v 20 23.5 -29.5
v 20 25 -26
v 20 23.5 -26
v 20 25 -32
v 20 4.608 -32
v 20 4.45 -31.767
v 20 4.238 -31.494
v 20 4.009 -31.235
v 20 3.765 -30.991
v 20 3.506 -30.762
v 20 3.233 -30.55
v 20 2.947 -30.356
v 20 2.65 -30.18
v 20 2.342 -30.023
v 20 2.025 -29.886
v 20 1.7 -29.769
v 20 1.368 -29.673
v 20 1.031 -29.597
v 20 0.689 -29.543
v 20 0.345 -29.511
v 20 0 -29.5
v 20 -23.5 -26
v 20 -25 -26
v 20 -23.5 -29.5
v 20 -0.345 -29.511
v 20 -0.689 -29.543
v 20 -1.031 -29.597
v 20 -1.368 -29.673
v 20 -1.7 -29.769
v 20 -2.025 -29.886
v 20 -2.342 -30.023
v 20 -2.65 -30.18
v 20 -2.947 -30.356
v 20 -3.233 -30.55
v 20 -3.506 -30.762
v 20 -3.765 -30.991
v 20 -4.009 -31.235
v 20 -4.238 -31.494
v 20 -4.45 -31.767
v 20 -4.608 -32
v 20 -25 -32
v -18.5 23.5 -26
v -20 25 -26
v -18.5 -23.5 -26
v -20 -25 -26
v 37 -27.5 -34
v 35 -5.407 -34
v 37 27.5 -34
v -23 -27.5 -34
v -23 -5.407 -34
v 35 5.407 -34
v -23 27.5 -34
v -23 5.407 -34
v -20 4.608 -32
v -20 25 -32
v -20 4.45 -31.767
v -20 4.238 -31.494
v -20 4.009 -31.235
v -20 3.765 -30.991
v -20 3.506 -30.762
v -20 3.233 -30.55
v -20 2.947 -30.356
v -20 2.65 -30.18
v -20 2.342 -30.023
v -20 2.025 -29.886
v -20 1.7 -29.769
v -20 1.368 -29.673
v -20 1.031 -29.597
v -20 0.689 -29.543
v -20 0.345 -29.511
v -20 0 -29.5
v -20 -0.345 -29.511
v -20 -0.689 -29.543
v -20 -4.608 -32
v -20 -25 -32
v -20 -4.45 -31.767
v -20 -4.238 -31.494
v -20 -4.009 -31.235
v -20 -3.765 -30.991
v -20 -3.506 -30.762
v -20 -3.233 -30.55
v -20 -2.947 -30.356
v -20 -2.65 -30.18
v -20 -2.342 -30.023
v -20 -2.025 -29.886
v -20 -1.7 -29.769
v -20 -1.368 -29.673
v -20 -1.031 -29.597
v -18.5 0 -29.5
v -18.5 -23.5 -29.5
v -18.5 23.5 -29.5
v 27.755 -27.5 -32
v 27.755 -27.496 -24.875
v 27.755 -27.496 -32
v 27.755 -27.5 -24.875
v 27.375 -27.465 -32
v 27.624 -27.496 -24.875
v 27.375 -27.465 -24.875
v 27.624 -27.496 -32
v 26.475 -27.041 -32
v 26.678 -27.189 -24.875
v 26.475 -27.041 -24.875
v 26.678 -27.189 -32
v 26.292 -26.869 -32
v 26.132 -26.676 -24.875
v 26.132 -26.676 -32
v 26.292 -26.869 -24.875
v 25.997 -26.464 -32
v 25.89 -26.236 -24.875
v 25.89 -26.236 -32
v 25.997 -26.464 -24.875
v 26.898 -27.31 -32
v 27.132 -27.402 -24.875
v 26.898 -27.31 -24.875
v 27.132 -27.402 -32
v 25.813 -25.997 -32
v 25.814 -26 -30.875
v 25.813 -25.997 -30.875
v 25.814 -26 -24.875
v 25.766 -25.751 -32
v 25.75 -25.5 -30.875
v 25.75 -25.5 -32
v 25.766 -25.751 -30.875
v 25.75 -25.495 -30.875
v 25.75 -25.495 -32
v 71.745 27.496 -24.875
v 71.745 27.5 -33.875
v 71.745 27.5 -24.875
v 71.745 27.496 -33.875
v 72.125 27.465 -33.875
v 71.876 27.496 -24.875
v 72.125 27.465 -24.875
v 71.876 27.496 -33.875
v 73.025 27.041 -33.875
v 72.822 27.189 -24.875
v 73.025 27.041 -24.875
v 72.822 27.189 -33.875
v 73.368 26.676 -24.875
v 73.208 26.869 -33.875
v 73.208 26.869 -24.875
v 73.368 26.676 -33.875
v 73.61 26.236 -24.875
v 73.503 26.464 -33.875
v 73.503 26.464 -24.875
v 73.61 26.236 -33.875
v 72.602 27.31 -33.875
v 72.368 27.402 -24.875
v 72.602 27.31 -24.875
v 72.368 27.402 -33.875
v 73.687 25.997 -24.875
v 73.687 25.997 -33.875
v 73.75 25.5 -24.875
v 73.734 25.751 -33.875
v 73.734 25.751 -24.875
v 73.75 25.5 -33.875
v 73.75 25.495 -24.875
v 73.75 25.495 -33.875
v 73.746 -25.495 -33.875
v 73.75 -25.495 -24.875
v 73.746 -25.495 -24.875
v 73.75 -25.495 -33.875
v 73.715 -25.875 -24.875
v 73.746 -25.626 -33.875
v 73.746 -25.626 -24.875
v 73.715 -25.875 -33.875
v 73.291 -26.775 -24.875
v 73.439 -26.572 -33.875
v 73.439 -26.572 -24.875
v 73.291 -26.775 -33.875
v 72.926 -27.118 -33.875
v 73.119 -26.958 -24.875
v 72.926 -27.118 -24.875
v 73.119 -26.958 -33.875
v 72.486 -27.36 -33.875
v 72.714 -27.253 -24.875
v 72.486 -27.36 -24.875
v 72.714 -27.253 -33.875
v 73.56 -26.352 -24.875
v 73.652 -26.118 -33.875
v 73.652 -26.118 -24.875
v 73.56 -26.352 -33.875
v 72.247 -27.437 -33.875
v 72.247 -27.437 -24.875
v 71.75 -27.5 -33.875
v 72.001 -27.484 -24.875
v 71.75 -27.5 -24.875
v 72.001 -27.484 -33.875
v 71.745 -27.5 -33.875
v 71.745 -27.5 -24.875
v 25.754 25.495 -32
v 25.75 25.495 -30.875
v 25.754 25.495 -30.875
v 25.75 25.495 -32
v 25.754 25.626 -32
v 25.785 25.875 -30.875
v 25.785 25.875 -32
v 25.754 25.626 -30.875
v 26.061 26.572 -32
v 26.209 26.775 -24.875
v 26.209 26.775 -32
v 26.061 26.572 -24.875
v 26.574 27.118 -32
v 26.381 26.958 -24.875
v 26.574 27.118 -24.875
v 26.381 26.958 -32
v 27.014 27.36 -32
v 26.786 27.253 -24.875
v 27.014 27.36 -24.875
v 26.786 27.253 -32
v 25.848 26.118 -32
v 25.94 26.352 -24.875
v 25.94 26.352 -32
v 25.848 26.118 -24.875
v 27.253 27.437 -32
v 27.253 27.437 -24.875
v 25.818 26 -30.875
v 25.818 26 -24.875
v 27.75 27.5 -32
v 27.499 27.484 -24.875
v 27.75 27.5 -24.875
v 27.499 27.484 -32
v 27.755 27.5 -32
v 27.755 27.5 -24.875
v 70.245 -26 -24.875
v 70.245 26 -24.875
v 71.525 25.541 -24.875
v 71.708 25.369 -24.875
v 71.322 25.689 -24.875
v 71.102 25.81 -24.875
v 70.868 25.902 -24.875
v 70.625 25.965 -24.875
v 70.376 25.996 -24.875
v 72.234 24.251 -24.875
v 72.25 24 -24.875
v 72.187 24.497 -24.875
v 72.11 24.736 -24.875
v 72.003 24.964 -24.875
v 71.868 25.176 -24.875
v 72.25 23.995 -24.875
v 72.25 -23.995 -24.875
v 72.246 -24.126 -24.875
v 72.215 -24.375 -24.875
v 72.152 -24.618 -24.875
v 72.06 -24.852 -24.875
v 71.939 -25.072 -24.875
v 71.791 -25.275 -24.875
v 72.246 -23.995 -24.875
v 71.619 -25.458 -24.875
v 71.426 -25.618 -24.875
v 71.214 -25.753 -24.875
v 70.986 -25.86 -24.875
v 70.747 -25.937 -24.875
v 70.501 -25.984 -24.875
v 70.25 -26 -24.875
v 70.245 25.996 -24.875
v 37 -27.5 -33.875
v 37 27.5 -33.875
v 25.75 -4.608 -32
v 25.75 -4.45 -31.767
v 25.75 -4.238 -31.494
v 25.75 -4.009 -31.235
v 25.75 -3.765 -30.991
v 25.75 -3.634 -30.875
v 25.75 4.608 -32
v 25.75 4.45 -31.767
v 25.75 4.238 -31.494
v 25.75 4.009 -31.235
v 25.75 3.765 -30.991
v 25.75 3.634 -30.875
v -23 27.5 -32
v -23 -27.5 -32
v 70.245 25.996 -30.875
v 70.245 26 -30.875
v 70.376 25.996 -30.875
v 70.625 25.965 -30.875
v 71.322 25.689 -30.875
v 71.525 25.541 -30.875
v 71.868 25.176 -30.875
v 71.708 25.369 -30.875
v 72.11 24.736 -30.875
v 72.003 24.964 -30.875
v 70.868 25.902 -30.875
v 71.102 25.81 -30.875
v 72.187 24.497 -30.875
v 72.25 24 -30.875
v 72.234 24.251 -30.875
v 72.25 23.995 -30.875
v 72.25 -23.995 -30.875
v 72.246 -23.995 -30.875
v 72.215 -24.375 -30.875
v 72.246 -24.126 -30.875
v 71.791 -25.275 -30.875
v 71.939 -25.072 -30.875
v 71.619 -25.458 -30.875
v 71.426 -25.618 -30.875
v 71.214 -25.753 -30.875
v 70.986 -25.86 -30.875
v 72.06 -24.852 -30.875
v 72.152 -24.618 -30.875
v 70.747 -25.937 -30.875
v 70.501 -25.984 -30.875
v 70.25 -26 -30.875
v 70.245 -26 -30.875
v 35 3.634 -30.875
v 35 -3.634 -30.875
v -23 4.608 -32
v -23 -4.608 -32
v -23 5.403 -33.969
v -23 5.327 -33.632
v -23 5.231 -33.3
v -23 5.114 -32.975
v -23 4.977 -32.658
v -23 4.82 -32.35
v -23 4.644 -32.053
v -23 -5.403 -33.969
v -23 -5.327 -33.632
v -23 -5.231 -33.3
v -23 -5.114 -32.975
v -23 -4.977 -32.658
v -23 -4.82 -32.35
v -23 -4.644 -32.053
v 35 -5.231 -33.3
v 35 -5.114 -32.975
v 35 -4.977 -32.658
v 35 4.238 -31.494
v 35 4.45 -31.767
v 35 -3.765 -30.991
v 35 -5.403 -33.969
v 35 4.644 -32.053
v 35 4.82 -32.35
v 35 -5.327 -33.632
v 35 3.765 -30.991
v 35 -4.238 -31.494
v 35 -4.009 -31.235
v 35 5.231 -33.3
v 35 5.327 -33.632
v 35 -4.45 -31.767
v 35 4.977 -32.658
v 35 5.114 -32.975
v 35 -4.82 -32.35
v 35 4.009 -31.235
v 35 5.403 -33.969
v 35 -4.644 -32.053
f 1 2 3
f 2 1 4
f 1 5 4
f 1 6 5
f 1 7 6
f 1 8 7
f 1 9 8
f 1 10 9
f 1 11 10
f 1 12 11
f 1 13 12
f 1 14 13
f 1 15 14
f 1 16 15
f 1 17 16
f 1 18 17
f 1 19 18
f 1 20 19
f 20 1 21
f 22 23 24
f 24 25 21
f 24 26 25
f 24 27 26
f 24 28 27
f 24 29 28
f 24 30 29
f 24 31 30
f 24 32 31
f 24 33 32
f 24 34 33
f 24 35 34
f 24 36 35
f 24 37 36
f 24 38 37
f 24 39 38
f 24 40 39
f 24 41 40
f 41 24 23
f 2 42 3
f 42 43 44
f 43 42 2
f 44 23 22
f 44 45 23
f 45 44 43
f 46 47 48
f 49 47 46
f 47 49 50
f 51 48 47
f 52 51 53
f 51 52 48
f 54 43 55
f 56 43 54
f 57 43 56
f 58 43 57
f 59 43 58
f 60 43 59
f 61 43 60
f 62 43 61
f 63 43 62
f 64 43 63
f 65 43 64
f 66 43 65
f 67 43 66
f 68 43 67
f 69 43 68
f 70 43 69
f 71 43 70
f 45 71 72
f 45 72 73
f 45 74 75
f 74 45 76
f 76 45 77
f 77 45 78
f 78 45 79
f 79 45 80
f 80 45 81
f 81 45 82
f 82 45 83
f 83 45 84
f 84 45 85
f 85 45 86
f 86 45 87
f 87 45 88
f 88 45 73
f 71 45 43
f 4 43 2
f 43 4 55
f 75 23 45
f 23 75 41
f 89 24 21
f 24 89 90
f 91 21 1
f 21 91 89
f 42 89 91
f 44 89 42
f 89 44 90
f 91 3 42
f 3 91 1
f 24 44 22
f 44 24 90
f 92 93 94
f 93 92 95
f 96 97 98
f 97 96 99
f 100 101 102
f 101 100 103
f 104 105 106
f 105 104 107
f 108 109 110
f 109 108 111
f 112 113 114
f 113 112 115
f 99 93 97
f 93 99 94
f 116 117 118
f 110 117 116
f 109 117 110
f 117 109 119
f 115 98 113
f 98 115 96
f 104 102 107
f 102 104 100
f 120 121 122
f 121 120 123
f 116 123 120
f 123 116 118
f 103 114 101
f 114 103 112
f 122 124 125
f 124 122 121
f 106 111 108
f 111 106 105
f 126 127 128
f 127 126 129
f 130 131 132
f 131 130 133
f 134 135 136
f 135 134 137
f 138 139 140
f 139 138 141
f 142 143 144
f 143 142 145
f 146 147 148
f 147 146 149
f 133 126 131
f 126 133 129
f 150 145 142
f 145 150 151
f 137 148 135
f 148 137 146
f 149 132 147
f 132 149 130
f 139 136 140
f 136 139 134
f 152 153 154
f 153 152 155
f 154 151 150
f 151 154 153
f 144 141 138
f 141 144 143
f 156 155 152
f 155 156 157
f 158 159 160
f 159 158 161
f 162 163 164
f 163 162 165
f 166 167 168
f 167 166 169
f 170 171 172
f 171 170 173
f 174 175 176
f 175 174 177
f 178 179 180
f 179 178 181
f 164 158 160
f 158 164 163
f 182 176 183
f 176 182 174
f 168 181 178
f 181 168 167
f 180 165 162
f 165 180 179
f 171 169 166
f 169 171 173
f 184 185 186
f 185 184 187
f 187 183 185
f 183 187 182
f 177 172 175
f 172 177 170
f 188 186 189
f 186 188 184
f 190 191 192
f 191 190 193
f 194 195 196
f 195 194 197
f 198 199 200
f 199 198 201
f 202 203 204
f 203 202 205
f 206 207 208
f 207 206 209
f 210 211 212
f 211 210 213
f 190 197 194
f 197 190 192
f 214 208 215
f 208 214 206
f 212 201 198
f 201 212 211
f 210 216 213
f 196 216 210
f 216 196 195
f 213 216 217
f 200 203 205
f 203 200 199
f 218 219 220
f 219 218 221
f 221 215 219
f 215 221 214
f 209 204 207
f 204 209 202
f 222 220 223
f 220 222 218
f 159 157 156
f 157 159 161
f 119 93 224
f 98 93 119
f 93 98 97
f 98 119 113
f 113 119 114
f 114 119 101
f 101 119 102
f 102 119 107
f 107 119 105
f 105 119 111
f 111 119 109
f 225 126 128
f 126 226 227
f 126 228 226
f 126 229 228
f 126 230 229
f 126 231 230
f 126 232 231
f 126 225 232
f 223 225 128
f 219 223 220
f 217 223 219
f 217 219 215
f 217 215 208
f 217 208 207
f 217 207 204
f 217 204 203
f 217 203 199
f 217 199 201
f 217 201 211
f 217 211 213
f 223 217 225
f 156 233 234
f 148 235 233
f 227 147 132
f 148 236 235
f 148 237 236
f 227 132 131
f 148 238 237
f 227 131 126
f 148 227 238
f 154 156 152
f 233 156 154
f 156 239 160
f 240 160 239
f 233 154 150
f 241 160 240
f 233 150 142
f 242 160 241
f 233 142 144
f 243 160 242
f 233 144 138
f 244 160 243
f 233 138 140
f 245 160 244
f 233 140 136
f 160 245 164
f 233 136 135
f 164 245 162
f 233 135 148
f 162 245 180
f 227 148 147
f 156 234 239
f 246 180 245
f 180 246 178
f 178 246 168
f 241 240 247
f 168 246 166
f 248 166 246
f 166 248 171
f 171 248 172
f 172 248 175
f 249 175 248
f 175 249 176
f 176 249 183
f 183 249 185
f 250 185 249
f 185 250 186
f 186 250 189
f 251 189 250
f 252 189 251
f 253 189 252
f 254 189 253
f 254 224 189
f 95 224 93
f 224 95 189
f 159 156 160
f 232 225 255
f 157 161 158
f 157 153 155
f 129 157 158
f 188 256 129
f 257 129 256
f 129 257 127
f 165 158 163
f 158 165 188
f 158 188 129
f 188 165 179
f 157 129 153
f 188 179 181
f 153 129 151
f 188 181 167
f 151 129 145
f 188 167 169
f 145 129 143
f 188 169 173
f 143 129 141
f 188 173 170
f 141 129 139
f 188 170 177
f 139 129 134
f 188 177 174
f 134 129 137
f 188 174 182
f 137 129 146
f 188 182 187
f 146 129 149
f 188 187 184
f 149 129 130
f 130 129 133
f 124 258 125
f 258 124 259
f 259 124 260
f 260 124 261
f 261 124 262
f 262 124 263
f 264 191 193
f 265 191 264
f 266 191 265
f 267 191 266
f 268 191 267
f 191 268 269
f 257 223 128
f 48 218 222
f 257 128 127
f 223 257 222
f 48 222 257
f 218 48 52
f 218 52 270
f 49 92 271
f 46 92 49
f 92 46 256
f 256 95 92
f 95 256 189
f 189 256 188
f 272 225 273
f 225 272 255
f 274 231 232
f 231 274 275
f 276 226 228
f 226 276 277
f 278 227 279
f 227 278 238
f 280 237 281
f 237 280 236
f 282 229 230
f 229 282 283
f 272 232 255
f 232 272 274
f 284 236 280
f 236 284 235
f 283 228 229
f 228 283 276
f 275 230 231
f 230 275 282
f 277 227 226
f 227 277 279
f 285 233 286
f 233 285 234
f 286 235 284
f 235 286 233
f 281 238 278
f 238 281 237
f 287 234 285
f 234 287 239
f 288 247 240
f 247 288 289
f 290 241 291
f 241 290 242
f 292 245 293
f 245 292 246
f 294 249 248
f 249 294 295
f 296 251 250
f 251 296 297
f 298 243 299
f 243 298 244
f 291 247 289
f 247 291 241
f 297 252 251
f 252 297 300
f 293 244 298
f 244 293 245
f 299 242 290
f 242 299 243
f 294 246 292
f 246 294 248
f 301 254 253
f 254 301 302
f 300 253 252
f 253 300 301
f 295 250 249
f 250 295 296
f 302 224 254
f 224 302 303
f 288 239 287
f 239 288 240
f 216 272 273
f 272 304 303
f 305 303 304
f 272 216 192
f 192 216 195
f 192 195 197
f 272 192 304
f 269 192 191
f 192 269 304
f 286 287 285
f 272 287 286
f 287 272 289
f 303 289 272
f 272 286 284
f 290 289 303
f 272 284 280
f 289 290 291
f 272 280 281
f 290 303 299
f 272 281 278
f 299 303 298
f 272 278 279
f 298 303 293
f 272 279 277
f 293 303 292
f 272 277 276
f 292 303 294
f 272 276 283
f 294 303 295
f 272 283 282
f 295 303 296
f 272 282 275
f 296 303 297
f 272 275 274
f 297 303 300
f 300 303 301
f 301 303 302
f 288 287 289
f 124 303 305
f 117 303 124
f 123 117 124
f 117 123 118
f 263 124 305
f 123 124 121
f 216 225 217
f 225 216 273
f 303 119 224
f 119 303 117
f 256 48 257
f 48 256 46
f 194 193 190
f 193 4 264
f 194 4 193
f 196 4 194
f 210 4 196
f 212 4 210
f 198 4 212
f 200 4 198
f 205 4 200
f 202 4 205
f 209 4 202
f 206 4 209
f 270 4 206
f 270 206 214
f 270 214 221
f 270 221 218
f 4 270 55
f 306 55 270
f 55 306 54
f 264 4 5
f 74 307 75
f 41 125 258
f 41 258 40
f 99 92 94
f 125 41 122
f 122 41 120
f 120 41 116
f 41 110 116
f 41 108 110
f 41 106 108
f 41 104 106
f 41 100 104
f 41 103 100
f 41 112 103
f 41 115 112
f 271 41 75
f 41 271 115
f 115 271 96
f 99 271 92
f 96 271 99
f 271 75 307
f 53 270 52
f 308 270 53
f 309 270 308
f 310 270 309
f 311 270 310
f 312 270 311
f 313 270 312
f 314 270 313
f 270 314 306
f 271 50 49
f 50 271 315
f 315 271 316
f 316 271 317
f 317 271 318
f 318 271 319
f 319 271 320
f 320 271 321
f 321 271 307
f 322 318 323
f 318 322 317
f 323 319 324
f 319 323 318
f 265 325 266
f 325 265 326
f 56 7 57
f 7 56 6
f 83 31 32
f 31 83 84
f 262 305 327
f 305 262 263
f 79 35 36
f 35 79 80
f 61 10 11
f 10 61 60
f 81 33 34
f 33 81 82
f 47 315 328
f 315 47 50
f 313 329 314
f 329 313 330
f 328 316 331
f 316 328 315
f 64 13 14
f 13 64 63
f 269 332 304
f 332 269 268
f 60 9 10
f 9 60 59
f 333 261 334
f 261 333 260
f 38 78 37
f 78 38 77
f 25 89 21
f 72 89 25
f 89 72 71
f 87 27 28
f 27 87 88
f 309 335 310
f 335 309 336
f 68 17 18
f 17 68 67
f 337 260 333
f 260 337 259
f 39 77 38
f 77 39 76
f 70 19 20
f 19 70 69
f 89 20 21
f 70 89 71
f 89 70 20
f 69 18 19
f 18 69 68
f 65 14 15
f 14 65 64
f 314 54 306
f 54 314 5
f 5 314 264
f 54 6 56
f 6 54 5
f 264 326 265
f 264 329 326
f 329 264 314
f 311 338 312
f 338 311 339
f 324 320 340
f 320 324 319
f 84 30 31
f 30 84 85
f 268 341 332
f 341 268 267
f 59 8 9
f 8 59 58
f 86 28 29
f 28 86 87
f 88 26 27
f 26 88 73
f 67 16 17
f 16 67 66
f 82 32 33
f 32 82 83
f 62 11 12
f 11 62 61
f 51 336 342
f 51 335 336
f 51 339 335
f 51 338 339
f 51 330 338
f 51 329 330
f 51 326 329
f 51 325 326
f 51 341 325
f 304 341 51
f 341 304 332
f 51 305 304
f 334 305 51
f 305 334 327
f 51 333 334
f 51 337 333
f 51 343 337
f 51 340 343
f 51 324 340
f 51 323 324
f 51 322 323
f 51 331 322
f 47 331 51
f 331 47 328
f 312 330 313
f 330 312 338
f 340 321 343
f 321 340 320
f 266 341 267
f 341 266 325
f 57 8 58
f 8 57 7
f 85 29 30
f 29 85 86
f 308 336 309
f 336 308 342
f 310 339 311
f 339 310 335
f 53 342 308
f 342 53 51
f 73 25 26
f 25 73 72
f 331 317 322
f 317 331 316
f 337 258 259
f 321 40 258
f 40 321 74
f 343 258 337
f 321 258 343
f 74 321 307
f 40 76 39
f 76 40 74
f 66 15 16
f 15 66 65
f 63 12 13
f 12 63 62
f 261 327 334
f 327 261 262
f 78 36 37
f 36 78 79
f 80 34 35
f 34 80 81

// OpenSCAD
//scale the beetleblocks export
scaleUp = 15;
//scale the logo when importing
scaleDown = 0.12;
wirevoid = 9;

// Build everything

/*translate([0,0,10])
difference() {
    lid(37, 47, 30, 3, 14, wirevoid);
    //Subtract the logo from the front//Needs some trig to calculate the angle to match the front plinth slope rather than have to state it
         //rotate([72,0,90])translate([0,-5,26])scale([scaleDown, scaleDown, scaleDown])surface(file = "/Users/Power5/DesktopFlunstellas/models/nmclogo.png", center = true, invert = true);
}
*/
//translate([0,0,59.5])
//stalk(40,3,wirevoid);
//translate([0,0,90])happySphere();
translate([0,0,-30])
difference(){
    base(37,47,5,3);
    translate([-15, 0, -5])rotate([90,0,90])cylinder(h=100, d=11, center=true, $fn=100);
}


// Define the modules
// Base for the microbit and 170 tie point mini breadboard
//Box Base
module base(x,y,z, thickness){
    difference() {
        cube([x +thickness , y+thickness, z+thickness], center=true);
        translate([0,0,thickness])
        cube([x, y, z], center=true);
        translate([x/2,0,thickness])
        cube([10, y, z], center=true);
        }
        translate([x+x/4+6.5-thickness,0,z/8])
        base2(45,52,9,2,9.5,thickness);
        translate([x-60,-y/2-4,-z-z/-5])
        cube([60,47+8,2]);
    }
    
 module base2(x, y, z, cornerRadius, filletHeight, thickness){
     difference() {
        roundedCube(x+thickness, y+thickness, z, cornerRadius, filletHeight+thickness);
        translate([0,0,thickness])
        roundedCube(x, y, z, cornerRadius, filletHeight);
        translate([x/-2+2,0,thickness])
        cube([15, y, z], center=true);
        }
    }
     

//The box lid base to allow for coiled wiring of rgb resistors etc, allowing for wiring into microbit
//Box lid(37,47,30,3)
module lid(x, y, z, thickness, baseSlantLimit, wireVoid) {
                //remove an area for the breadboard joining slot
            difference(){
                //subtract the breadboard size
                difference() {
                    cube([x+thickness, y+thickness, z+thickness], center=true);
                    translate([0, 0, -2])cube([x, y, z], center=true);
                    }
                //combine join breadboard join slot and space for usb out
                    union(){
                        union(){
                            translate([0, y/-2, z/-2])cube([4.5, 1.5, 5], center=true)translate([x/-2, y/-2, z/-2])cube([15.5, 5.5, 5], center=true);
                            translate([x/-2, 0, z/-2-2])rotate([90,0,90])cylinder(h=4, r=5, center=true, $fn=100);
                        }
                        translate([0,0,15])cylinder(h = 20, d = wireVoid + 2, center = true);
                    }
                    }
                    // remove an area for the microbit LED array 
                    difference(){
                            rotate([90,0,0])translate([x/2+thickness/2,z/-2-(thickness/2),y/-2-(thickness/2)])myPoly(y+3,z+thickness,14-thickness);
                        // include the adjustment to sit flush with microbit
                        union() {
                            translate([baseSlantLimit+x/2, 0, z/-2+2])cube([10, 20, 10], center=true);
                            translate([baseSlantLimit-2, 0, (z/-2)])cube([40, 51.5, 10], center=true);
                        }
                    }
    
                        //redundant rear angle on plinth
    //rotate([90,0,180])translate([20.5,2,-26.5])myPoly(53,16,14);
    }
    
// Build an angled plinth front by extruding from a 3 sided polygon/triangle
// myPoly
 module myPoly(length, polyHeight, baseSlantLimit) {
     //array of points for the polygon
     a=[[0,0],[baseSlantLimit,0],[0,polyHeight]];
         linear_extrude(height = length, center = false, convexity = 10, twist = 0)polygon(a);
       
 }


// Build the 'stalk' for the wires to go up into the beetleblocks shape
 // include a 'screw' to help secure
//Stalk

module stalk(height, screwHeight, void) {
    difference() {
        cylinder(h=height,d=void+3,center=true);
        cylinder(h=height+1,d=void,center=true);
    }
    translate([0,0,height/-2])
    difference() {
        cylinder(h=screwHeight,d=void+1,center=true);
        cylinder(h=screwHeight+1,d=void,center=true);
    }
}

// happySphere from the beetleblocks export
module happySphere() {
    difference(){
        scale([scaleUp, scaleUp, scaleUp])import("/Users/Power5/Downloads/FeelingPrinting.stl");
        sphere(15);
        }
    }




module roundedCube(x, y, z, cornerRadius, filletHeight){
    difference() {
        cube([x, y, z], center=true);
        rotate([0,0,0])translate([(x/-2),(y/-2),0])
        fillet(cornerRadius, filletHeight,10);
        rotate([0,0,180])translate([(x/-2),(y/-2),0])
        fillet(cornerRadius,10);
        rotate([0,0,90])translate([(y/-2),(x/-2),0])
        fillet(cornerRadius,10);
        rotate([0,0,270])translate([(y/-2),(x/-2),0])
        fillet(cornerRadius,10);
    }
}

module fillet(r, h) {
    translate([r / 2, r / 2, 0])
    difference() {
        cube([r + 0.01, r + 0.01, h], center = true);
        translate([r/2, r/2, 0])
        cylinder(r = r, h = h + 1, center = true, $fn=50);
        }
}
 
